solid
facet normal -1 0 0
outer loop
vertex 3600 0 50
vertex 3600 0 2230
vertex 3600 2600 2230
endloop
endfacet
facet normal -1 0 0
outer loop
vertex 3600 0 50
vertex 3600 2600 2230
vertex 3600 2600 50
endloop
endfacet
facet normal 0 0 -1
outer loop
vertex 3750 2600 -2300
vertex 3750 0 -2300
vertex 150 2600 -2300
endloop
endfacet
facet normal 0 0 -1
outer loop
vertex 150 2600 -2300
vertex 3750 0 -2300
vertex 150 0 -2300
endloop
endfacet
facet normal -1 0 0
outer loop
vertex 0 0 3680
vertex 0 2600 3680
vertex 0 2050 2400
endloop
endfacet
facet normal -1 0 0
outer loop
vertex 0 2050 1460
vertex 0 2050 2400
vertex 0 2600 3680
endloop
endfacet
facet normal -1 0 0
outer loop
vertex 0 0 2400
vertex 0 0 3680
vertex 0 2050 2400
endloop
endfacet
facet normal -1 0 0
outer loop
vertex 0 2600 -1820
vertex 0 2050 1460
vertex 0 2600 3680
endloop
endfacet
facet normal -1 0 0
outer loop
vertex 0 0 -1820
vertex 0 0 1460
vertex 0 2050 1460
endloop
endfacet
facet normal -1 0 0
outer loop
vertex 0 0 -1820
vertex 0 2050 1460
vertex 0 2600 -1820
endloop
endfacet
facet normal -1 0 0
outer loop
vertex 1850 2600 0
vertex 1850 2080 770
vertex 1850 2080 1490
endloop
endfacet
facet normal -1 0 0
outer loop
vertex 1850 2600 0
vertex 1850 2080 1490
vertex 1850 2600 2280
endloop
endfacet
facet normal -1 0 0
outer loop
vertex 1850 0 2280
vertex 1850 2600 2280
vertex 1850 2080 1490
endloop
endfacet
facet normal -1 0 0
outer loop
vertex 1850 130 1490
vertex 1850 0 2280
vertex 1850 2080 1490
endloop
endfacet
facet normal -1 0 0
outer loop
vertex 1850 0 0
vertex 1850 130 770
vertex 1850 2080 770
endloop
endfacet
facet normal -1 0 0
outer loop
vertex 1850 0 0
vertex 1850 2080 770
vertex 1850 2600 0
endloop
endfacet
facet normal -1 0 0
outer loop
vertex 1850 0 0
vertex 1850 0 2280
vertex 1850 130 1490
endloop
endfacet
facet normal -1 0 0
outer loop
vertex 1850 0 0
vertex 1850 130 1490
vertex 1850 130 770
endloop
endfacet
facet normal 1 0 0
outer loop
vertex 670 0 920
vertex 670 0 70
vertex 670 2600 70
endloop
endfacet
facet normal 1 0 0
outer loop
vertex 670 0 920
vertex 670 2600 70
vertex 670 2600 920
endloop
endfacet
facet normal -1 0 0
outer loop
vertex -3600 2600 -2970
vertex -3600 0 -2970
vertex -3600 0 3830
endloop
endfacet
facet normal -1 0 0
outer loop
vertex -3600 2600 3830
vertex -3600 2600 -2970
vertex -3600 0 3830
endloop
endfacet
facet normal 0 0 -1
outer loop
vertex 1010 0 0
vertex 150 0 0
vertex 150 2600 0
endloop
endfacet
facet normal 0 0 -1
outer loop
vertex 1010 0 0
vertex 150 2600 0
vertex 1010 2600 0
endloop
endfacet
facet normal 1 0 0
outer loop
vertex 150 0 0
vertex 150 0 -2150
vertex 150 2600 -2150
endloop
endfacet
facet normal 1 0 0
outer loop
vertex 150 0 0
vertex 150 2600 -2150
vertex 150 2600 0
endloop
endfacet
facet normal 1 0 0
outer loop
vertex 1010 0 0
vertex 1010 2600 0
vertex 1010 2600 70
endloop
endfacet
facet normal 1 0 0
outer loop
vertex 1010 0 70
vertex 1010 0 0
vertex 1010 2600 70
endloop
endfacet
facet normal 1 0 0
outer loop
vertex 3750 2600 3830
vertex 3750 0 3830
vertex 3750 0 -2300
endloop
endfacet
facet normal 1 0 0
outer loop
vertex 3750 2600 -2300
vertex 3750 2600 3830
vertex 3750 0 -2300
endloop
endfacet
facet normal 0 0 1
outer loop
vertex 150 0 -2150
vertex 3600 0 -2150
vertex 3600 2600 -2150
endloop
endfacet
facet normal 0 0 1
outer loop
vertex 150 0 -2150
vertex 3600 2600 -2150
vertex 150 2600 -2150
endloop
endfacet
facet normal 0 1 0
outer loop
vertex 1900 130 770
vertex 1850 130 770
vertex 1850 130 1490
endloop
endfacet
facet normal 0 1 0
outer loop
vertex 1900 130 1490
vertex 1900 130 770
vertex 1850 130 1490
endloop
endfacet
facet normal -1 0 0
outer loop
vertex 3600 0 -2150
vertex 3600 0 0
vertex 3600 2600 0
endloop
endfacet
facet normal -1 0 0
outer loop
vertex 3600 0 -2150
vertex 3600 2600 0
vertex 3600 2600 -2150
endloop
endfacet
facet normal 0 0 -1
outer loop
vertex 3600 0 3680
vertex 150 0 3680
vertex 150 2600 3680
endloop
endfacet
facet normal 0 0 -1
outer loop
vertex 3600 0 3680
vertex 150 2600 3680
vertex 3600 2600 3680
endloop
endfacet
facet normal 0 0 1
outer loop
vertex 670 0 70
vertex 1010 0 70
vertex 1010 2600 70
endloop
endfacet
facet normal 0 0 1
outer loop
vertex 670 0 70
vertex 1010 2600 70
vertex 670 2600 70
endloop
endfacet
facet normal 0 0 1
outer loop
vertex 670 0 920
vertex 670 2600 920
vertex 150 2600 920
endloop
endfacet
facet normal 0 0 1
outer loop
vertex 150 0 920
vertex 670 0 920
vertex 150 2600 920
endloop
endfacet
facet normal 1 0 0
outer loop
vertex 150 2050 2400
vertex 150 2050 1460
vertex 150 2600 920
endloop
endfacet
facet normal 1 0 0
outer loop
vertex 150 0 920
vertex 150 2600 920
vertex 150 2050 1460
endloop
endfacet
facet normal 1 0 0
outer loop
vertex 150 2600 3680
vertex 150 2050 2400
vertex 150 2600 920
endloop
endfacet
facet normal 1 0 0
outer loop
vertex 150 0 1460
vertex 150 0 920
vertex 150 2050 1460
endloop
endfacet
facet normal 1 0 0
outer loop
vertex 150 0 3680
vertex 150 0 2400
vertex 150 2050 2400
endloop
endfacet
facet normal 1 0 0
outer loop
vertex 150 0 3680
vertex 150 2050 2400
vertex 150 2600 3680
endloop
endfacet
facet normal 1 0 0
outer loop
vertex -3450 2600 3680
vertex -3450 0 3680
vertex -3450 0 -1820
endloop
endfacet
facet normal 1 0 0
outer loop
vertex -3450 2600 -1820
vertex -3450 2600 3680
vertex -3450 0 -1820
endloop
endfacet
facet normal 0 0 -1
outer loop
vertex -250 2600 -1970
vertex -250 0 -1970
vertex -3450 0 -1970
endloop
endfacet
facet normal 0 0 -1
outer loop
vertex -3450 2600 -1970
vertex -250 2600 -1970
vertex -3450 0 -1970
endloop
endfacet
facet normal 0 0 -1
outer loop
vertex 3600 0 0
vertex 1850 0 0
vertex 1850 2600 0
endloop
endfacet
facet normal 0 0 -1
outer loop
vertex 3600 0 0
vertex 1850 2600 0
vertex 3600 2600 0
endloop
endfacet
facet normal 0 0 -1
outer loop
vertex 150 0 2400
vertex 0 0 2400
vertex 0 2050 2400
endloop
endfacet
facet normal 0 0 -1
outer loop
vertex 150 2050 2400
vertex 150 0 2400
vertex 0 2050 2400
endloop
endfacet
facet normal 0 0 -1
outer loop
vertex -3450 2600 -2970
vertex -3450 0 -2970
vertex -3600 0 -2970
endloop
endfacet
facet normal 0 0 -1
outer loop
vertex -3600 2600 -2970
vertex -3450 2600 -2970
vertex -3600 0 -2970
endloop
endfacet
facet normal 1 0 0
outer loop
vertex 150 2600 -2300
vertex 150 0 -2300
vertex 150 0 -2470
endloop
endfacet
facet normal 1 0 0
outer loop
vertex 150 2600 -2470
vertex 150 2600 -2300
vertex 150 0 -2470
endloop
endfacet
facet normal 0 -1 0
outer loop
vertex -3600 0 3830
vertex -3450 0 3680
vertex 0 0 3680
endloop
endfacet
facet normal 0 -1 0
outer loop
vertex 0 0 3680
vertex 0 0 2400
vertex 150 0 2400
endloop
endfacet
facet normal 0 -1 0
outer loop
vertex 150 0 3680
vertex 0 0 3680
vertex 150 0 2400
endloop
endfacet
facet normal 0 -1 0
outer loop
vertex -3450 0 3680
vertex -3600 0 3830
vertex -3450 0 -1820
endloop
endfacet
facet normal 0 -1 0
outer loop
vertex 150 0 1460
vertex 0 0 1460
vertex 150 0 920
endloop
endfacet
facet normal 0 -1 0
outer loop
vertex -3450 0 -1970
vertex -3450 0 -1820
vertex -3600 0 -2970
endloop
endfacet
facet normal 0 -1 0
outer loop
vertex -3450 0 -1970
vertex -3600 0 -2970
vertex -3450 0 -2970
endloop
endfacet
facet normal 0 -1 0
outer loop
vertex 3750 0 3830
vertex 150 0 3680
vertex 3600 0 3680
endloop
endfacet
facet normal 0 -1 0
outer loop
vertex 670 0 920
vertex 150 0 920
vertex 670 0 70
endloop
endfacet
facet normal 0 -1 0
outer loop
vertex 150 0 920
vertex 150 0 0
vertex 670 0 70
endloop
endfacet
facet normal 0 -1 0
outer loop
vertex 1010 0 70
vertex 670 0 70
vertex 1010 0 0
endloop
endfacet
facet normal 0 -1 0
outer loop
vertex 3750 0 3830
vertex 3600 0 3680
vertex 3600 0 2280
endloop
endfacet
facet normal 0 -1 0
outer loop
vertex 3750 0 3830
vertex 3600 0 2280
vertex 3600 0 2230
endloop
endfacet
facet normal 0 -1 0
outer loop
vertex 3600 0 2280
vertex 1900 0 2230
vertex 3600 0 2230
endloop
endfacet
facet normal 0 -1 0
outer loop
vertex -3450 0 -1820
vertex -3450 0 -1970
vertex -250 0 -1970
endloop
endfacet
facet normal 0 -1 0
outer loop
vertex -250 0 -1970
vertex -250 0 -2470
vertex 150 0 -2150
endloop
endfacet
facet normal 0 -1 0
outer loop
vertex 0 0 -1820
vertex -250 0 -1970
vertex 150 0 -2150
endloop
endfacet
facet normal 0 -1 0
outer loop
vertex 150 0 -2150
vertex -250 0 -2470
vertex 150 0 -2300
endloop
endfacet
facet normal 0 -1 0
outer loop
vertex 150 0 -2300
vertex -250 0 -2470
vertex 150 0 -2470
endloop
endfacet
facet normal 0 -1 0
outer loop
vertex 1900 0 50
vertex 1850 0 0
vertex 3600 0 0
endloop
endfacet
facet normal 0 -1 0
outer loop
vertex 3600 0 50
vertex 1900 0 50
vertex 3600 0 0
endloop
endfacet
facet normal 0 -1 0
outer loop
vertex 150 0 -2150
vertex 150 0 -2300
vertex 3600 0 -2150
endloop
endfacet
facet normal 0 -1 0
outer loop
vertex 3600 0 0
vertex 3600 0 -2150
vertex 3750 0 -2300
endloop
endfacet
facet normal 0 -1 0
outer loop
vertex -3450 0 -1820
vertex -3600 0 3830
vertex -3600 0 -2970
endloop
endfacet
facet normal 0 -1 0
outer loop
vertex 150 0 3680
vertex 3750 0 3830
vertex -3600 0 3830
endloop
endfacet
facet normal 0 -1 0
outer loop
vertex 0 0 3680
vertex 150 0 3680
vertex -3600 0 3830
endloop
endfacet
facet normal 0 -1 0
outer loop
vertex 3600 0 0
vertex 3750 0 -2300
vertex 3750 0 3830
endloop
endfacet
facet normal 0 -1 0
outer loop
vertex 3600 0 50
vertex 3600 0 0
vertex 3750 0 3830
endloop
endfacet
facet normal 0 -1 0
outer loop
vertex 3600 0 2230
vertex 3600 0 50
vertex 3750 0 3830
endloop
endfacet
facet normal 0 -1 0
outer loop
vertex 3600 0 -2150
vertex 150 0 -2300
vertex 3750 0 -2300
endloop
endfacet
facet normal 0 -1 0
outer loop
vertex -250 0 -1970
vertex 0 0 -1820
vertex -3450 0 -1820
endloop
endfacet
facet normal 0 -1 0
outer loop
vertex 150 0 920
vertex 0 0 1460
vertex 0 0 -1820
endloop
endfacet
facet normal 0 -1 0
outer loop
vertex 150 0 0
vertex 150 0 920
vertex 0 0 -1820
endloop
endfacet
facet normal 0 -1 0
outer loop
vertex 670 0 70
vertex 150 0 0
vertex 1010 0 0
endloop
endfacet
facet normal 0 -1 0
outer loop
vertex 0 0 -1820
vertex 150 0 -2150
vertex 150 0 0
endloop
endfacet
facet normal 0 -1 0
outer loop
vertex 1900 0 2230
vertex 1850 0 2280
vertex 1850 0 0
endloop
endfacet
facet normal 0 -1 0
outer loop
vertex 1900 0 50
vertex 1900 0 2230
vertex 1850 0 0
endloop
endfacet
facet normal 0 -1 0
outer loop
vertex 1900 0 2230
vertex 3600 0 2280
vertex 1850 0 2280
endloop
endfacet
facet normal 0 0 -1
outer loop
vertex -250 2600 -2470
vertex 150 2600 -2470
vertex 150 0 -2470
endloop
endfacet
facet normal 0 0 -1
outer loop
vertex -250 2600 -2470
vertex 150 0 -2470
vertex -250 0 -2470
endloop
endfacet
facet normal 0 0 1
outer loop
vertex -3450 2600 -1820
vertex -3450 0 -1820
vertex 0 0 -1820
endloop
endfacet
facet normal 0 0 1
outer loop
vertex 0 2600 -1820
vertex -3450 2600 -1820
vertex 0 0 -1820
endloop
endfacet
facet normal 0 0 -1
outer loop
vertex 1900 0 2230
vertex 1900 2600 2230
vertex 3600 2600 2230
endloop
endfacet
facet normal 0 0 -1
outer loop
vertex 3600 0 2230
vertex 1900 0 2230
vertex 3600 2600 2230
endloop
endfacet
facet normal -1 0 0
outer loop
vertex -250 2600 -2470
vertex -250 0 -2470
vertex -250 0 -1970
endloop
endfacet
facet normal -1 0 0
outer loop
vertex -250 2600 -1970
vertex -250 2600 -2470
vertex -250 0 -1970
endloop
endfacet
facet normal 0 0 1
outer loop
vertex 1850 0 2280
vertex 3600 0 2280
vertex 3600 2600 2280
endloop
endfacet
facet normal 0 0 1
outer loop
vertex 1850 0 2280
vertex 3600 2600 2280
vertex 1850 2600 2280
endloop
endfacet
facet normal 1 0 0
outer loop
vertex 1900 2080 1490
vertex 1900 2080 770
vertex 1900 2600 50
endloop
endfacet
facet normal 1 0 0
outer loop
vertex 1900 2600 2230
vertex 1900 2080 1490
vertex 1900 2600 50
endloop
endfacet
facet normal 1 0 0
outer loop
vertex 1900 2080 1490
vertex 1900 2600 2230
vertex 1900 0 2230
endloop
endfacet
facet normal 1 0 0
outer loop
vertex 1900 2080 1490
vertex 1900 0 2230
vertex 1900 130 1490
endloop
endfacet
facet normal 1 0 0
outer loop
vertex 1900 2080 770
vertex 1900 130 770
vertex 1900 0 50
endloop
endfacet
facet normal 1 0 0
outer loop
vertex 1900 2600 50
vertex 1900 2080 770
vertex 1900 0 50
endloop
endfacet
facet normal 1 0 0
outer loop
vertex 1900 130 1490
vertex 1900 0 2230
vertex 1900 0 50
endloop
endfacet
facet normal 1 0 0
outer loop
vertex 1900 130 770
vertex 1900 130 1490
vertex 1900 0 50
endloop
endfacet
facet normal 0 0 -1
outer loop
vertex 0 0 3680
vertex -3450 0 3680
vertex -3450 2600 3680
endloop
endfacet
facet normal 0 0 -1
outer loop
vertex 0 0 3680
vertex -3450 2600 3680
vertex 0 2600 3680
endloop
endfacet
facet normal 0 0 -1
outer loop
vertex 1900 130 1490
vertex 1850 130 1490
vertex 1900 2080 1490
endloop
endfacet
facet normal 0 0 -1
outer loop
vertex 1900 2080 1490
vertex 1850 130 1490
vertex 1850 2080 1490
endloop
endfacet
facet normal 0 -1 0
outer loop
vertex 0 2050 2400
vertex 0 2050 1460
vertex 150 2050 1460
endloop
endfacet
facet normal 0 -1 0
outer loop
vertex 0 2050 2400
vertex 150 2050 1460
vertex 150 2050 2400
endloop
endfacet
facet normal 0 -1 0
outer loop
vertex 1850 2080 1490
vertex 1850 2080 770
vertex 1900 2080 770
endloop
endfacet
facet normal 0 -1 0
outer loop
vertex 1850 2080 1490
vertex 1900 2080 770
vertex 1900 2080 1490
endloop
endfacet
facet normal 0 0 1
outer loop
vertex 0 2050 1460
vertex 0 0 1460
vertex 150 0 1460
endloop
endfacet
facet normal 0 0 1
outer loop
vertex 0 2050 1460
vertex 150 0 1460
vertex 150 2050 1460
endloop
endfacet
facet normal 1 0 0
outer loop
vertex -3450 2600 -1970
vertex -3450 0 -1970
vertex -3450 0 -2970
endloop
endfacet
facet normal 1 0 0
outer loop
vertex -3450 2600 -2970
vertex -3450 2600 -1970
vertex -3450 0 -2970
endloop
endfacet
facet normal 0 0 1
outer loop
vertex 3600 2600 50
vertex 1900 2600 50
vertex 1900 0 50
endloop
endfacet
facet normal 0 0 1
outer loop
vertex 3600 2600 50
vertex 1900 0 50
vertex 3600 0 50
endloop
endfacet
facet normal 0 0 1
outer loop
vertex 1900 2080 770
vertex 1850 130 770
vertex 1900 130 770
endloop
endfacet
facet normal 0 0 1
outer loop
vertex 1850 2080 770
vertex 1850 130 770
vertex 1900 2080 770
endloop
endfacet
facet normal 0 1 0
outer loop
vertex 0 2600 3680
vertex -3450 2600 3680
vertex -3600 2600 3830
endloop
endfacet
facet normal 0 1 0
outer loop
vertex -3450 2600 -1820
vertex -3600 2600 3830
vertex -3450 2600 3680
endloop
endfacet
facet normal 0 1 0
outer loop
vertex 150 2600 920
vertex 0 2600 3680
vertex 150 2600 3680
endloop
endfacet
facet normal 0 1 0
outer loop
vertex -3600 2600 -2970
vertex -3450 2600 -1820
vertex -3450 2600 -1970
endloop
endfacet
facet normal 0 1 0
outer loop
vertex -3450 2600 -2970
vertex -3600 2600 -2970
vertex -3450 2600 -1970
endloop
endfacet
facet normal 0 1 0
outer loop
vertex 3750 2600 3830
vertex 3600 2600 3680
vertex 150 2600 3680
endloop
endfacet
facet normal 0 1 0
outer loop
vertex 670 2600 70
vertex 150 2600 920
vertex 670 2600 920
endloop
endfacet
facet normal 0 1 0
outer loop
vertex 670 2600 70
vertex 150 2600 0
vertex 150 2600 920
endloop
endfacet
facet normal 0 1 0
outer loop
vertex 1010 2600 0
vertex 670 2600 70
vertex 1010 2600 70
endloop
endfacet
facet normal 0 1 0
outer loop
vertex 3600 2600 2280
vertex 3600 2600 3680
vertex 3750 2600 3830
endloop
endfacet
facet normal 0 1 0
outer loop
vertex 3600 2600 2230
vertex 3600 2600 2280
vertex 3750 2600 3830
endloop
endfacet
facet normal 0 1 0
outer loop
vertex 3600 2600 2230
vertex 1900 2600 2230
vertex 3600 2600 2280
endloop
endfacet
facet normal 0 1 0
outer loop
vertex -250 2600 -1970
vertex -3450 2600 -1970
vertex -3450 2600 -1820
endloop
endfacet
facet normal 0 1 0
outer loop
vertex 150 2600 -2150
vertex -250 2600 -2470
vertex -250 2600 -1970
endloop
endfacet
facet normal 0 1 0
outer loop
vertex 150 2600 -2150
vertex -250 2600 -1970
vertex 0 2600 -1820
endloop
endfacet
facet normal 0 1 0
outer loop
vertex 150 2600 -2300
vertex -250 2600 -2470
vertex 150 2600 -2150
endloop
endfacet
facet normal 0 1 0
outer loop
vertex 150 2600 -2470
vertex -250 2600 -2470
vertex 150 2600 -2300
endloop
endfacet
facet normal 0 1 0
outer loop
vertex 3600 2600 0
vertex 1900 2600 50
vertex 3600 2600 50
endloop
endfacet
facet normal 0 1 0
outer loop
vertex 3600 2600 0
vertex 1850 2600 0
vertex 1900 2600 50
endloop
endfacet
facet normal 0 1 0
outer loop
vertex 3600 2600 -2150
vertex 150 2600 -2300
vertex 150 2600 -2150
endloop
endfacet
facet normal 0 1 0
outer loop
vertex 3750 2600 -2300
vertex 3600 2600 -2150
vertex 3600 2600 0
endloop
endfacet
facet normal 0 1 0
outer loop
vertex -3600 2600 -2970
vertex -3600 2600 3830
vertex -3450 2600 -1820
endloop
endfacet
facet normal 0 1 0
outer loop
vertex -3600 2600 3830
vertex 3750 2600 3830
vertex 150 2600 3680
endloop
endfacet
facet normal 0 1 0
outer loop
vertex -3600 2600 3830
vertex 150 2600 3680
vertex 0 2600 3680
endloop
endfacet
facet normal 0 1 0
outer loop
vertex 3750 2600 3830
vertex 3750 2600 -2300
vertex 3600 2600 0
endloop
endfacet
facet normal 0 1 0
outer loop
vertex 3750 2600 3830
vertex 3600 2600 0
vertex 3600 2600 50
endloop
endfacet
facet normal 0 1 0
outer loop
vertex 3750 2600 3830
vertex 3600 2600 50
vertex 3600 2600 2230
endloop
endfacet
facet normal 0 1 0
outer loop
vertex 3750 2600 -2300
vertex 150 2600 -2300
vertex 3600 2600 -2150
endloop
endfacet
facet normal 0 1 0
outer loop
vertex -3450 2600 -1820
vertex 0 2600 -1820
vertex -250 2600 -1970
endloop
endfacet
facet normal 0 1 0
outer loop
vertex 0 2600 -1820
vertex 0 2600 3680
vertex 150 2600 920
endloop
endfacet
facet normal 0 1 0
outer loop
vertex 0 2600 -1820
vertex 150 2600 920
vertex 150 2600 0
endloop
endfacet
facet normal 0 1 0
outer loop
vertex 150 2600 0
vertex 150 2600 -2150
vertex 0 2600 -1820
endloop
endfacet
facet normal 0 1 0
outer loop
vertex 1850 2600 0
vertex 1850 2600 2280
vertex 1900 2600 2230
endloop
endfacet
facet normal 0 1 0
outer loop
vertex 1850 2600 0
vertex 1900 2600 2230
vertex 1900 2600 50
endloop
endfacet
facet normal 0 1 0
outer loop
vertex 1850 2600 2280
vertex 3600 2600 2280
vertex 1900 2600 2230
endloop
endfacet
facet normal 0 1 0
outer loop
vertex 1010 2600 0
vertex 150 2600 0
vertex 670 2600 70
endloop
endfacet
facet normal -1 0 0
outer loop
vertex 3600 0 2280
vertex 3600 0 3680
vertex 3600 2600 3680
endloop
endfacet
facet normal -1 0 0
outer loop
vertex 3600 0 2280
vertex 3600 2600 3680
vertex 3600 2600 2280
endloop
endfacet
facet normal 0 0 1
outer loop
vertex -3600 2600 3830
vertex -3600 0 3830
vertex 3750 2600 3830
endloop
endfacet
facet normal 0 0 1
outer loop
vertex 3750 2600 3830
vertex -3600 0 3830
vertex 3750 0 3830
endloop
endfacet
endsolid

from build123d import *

# Parameters (mm, degrees)
SKETCH_1_W         = 3450
SKETCH_1_H         = 5500
SKETCH_1_W_2       = 1700
SKETCH_1_H_2       = 2180
EXTRUDE_1_DEPTH    = 2600
SKETCH1_W          = 940
SKETCH1_H          = 2050
CUT_EXTRUDE1_DEPTH = 150
SKETCH2_W          = 720
SKETCH2_H          = 1950
CUT_EXTRUDE2_DEPTH = 50


with BuildPart() as part:
    # Эскиз1 → Бобышка-Вытянуть1 (new body)
    with BuildSketch(Plane(origin=(0, 0, 0), x_dir=(1, 0, 0), z_dir=(0, 1, 0))):
        Polygon((-3600, 2970), (-3600, 839.388268919), (-3600, -3830), (3750, -3830), (3750, 2300), (150, 2300), (150, 2470), (-250, 2470), (-250, 1970), (-3450, 1970), (-3450, 2970), align=None)
        with Locations((-1725, -930)):
            Rectangle(SKETCH_1_W, SKETCH_1_H, mode=Mode.SUBTRACT)
        Polygon((150, 2150), (150, 0), (1010, 0), (1010, -70), (670, -70), (670, -920), (150, -920), (150, -3680), (3600, -3680), (3600, -2280), (1850, -2280), (1850, 0), (3600, 0), (3600, 2150), align=None, mode=Mode.SUBTRACT)
        with Locations((2750, -1140)):
            Rectangle(SKETCH_1_W_2, SKETCH_1_H_2, mode=Mode.SUBTRACT)
    extrude(amount=EXTRUDE_1_DEPTH)

    # Sketch1 → Cut-Extrude1 (cut)
    with BuildSketch(Plane.ZY):
        with Locations((1930, 1025)):
            Rectangle(SKETCH1_W, SKETCH1_H)
    extrude(amount=-CUT_EXTRUDE1_DEPTH, mode=Mode.SUBTRACT)

    # Sketch2 → Cut-Extrude2 (cut)
    with BuildSketch(Plane.ZY.offset(-1850)):
        with Locations((1130, 1105)):
            Rectangle(SKETCH2_W, SKETCH2_H)
    extrude(amount=-CUT_EXTRUDE2_DEPTH, mode=Mode.SUBTRACT)


solid = part.part
